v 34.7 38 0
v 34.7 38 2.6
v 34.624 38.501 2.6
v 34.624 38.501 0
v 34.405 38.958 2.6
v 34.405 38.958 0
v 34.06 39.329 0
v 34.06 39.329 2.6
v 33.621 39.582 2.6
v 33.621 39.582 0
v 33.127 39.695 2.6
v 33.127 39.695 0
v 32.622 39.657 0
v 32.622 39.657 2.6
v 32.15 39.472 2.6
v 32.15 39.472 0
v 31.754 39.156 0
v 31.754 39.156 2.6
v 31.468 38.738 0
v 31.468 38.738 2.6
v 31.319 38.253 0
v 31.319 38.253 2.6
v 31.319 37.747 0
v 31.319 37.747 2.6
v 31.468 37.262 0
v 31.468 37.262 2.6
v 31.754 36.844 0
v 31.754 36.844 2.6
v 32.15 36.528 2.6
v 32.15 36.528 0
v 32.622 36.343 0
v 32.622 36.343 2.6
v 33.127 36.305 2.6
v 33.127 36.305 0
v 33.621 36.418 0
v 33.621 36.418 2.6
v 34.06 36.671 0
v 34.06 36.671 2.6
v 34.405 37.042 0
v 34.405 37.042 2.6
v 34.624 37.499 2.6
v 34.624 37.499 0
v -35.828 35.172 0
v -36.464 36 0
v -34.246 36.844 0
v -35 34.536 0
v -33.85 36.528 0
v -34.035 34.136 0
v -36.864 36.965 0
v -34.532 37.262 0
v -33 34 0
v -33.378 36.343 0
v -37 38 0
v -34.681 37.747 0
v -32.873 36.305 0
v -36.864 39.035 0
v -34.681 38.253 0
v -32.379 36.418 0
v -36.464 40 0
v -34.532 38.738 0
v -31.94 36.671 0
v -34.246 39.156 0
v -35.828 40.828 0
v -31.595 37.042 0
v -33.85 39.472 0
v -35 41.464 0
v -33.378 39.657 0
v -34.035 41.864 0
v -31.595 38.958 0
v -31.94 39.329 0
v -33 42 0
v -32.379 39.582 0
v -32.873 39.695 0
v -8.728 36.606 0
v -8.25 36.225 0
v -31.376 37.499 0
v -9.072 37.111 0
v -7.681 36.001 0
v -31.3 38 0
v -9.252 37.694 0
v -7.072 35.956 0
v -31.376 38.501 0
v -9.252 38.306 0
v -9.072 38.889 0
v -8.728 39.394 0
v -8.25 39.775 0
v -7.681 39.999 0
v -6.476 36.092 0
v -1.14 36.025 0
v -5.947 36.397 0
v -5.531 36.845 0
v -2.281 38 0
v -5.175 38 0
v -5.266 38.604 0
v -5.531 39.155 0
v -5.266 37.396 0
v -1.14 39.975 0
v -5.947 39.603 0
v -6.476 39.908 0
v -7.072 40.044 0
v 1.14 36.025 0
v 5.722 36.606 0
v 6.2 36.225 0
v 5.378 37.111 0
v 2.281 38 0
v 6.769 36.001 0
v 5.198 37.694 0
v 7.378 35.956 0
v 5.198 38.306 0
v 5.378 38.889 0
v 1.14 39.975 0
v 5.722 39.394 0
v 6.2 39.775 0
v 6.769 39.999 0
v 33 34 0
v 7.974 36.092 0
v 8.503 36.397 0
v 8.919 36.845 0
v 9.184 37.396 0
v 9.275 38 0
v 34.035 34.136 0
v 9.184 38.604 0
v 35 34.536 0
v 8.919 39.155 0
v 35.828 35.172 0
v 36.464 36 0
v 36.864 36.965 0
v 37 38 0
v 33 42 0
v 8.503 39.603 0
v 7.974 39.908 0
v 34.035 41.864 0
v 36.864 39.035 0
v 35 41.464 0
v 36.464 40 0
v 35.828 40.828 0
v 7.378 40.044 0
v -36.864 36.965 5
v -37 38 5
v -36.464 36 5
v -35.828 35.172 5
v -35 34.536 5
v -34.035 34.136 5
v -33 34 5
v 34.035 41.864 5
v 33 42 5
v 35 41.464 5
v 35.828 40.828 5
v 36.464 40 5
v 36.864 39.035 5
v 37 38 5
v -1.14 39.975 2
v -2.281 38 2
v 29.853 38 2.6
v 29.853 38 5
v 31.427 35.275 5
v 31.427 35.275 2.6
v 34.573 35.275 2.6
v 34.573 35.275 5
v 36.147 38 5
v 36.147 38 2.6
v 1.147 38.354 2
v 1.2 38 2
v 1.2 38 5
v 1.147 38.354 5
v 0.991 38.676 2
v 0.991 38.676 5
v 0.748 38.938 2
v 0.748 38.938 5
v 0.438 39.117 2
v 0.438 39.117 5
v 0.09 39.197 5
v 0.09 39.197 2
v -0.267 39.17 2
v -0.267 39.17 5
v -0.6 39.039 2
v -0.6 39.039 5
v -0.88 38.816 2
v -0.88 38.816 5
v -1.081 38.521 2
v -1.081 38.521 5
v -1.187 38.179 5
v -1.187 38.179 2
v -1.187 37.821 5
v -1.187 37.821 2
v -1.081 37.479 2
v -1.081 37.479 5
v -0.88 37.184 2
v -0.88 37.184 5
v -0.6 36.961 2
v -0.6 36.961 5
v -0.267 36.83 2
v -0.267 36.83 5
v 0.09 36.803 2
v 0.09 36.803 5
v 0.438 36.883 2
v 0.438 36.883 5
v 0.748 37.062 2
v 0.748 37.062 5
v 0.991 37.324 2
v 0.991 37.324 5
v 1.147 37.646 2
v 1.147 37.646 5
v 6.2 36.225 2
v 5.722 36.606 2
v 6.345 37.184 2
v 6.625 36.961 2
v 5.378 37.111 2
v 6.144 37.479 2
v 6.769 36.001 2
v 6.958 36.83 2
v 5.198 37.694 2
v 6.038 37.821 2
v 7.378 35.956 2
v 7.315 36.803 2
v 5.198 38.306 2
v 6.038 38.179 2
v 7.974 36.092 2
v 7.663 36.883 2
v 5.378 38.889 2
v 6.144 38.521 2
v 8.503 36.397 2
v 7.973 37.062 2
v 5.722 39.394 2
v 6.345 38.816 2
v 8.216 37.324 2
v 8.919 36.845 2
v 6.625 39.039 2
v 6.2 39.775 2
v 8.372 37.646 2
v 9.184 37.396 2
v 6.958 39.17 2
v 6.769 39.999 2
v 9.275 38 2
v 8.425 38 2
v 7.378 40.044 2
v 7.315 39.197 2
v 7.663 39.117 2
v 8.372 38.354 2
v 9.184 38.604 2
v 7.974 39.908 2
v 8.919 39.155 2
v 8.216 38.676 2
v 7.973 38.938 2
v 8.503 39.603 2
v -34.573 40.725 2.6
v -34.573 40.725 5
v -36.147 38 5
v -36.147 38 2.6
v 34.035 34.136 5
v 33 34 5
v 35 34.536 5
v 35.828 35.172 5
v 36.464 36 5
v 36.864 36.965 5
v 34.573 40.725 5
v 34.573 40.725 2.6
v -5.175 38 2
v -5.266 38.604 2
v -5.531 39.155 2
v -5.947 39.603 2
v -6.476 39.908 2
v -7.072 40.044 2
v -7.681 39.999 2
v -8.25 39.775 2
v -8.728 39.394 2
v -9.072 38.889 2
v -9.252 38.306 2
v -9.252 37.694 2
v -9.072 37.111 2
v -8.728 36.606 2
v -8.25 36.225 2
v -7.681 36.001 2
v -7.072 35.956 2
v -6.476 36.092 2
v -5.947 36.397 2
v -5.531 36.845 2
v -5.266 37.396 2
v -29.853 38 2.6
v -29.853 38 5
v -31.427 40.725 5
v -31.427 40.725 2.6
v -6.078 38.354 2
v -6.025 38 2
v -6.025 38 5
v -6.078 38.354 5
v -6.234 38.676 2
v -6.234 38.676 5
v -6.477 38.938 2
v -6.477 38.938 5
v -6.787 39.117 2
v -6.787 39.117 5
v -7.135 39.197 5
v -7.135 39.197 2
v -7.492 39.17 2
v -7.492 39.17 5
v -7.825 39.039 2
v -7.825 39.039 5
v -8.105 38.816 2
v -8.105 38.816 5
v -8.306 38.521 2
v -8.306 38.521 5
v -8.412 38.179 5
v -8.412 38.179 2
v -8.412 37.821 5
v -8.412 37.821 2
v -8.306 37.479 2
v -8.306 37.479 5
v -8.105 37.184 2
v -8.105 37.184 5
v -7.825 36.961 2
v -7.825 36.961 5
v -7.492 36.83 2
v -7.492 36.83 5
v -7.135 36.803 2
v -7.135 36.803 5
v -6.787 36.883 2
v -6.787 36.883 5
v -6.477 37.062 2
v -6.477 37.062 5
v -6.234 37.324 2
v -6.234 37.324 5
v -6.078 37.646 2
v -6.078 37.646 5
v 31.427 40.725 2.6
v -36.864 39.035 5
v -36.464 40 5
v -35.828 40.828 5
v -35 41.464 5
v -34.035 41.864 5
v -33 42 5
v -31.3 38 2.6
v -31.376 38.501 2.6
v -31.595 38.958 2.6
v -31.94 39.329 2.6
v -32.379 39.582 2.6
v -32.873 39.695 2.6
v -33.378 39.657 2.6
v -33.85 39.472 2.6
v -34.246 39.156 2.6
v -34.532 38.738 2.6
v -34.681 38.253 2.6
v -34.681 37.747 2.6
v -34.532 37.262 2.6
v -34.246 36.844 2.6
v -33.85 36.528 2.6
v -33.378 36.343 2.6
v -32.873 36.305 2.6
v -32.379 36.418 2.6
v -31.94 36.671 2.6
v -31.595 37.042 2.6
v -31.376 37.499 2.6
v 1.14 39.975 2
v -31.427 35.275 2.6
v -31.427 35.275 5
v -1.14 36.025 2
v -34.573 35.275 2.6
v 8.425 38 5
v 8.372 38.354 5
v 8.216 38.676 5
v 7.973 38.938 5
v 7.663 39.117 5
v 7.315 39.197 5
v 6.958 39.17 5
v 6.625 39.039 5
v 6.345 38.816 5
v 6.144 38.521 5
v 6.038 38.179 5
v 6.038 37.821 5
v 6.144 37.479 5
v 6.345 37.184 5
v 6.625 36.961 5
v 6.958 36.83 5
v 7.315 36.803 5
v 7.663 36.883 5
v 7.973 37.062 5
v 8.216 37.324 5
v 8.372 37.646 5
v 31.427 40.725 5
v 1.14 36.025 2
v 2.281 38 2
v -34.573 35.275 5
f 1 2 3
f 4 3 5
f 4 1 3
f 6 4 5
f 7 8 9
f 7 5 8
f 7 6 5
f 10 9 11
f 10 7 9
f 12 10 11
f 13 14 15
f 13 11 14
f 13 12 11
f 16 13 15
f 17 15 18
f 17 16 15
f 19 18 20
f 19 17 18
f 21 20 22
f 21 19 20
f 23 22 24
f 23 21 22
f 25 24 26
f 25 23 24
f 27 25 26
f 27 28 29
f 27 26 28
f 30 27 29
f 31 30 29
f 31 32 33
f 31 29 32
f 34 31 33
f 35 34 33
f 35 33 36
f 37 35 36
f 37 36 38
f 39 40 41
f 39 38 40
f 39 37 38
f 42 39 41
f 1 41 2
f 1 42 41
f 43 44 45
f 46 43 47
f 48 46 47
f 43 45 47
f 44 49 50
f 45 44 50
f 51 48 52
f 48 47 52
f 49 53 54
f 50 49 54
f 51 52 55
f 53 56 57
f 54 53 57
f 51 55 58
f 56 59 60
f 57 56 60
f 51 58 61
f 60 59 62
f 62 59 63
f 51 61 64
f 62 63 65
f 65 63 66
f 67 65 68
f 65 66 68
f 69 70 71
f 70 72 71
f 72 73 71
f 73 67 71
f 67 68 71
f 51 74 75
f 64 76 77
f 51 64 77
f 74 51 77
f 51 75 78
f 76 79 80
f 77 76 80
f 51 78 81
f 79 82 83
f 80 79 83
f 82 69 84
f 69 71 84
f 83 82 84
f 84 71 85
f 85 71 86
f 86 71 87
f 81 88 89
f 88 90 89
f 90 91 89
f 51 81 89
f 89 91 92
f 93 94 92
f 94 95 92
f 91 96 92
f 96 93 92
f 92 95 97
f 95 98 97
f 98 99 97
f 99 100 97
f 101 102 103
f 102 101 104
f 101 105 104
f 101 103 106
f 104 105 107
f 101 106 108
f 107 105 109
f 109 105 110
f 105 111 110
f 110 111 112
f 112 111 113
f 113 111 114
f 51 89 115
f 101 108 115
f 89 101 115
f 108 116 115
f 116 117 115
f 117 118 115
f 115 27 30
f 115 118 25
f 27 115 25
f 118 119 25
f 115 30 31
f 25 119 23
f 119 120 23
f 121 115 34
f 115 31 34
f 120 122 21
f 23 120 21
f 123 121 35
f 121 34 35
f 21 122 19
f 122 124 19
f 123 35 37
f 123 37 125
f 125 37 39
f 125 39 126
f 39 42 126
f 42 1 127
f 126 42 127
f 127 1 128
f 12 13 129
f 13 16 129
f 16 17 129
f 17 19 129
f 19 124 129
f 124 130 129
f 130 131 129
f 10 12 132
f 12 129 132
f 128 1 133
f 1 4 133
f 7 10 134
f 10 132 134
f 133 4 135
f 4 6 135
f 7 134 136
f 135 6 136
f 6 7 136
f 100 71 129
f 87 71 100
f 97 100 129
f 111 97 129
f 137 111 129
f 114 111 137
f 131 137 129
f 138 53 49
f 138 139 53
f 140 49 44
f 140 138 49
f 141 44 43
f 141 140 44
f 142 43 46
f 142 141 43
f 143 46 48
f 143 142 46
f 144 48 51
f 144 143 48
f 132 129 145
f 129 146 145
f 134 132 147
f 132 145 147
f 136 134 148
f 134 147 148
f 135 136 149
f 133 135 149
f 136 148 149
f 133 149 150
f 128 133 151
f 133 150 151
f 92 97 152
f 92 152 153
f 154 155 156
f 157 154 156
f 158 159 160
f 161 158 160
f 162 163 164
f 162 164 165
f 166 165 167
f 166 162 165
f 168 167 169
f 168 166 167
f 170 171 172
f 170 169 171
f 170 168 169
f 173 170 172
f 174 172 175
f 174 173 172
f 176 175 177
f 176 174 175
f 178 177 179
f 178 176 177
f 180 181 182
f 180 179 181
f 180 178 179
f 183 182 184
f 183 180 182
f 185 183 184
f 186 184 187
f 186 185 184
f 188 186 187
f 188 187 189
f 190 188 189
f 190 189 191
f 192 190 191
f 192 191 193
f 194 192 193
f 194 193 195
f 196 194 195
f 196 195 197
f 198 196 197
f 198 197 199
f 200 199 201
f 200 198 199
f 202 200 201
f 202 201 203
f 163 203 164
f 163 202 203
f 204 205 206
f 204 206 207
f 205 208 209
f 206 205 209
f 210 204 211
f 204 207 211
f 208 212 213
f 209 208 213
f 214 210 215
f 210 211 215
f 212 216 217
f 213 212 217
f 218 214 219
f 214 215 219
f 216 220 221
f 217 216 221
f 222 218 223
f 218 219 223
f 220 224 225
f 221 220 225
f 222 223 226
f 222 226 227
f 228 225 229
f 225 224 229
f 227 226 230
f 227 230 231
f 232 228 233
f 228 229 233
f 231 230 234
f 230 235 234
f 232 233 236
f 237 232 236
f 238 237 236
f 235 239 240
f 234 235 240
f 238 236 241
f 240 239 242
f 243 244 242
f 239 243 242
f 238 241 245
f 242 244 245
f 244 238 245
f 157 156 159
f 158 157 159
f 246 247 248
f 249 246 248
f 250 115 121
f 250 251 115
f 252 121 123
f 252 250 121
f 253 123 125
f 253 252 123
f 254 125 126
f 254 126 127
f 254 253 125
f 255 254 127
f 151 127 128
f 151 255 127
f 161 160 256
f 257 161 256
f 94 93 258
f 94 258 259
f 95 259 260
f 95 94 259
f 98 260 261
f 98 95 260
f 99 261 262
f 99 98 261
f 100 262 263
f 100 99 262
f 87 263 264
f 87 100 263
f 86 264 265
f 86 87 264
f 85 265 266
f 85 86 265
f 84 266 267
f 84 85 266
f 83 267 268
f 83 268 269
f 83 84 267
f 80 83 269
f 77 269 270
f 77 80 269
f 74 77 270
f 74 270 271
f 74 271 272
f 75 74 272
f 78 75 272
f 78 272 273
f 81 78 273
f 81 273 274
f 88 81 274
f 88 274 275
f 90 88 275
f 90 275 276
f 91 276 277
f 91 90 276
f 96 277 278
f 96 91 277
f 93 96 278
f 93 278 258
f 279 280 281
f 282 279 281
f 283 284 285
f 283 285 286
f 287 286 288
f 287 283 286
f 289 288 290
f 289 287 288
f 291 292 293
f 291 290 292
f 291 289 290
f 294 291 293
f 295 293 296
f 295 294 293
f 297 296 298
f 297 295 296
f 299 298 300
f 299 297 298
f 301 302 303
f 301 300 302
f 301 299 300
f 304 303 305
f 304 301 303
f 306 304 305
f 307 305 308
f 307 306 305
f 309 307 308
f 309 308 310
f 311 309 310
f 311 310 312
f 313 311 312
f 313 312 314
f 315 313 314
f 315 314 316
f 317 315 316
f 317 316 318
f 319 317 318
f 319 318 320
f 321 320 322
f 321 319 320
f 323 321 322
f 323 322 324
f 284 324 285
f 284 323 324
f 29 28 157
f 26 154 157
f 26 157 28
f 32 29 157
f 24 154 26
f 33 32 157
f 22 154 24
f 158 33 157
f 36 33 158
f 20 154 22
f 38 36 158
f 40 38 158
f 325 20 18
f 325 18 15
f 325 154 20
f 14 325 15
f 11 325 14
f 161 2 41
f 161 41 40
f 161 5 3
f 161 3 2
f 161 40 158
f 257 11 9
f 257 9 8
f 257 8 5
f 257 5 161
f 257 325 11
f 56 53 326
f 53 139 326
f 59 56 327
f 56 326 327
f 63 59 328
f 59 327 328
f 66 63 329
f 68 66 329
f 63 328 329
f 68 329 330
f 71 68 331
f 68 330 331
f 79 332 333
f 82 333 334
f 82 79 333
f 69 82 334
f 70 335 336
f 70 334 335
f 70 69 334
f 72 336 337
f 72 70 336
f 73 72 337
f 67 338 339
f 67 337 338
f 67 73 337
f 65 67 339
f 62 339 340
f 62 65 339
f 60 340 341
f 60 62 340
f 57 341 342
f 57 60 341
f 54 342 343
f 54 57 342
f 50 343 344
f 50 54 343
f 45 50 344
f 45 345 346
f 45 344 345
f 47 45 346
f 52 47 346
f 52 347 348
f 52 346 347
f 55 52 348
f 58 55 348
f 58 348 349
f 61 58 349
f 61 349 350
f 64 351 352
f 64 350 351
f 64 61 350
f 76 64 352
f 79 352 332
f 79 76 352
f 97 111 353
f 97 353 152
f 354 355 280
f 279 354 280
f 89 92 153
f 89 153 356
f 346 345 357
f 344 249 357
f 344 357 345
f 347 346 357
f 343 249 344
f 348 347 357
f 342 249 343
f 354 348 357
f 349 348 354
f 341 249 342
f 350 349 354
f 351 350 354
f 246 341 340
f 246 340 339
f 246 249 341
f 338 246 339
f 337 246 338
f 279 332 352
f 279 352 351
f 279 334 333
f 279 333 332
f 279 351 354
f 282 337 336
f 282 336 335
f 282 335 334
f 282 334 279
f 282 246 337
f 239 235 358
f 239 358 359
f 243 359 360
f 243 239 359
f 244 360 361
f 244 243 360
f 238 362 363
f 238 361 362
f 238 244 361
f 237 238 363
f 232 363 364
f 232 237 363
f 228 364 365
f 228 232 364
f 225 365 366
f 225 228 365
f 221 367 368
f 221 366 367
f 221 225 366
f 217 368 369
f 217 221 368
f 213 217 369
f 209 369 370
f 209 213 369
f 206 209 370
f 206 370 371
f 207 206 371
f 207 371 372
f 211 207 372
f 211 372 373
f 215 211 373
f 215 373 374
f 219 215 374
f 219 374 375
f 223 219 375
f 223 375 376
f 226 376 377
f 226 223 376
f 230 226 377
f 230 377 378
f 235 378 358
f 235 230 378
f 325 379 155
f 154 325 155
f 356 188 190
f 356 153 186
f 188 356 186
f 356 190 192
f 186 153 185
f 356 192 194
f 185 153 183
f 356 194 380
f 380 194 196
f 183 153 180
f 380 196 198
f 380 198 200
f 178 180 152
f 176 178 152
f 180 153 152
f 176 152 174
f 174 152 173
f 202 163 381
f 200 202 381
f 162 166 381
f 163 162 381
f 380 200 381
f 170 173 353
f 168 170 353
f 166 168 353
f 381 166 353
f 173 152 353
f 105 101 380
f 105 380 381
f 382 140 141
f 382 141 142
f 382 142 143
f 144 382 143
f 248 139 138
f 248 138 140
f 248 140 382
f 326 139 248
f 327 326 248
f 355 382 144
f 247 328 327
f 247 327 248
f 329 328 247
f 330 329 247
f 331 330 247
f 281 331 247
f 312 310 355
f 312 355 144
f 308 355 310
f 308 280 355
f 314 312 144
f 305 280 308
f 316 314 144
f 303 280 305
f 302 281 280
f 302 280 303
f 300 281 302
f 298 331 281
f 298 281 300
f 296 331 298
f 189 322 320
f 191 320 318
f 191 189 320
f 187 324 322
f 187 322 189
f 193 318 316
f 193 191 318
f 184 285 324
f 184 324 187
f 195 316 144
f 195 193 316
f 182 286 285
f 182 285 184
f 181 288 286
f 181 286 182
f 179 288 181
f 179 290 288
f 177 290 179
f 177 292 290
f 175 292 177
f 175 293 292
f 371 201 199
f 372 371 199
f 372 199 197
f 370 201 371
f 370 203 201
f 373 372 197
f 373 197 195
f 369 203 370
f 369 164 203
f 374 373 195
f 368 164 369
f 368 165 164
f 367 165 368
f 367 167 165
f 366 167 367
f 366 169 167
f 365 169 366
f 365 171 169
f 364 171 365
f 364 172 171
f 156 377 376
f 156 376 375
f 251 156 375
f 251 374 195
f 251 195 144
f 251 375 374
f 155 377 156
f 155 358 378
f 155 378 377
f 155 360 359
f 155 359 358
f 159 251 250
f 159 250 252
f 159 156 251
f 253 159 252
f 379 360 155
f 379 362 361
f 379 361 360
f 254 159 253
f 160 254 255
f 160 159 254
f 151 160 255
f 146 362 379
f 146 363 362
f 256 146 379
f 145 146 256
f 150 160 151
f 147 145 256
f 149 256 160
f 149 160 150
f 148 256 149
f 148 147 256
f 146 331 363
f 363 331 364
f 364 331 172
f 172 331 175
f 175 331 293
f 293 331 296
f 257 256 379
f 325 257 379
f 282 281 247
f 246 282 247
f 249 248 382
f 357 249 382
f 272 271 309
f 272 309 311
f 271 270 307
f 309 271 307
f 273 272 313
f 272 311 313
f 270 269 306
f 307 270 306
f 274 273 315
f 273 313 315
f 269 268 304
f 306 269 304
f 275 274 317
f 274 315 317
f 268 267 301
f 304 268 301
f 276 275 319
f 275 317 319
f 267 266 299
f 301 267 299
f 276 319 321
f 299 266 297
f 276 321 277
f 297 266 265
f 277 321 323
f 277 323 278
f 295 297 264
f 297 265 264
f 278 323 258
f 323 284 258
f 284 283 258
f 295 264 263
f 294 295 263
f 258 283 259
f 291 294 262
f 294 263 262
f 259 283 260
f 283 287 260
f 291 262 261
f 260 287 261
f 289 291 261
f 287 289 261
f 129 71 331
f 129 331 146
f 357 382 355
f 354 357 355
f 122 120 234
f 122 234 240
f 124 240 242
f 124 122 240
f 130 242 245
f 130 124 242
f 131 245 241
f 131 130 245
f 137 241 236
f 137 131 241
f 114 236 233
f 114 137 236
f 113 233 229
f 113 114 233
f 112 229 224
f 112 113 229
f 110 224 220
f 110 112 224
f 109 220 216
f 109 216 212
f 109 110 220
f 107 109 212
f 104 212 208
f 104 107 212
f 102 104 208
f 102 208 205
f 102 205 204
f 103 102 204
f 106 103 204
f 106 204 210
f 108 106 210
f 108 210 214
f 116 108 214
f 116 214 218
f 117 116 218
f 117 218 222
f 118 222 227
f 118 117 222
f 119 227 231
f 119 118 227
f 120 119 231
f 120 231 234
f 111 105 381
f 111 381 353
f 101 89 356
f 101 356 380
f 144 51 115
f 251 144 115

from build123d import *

# Parameters (mm, degrees)
F2_W      = 74
F2_H      = 8
F2_R      = 3
F5_DEPTH  = 5
F0_R      = 1.7
F6_DEPTH  = 12.5
F3_R      = 2.05
F7_DEPTH  = 2
F8_DEPTH  = 2
F10_DEPTH = 2.4
F11_R     = 3.99999
F4_R      = 1.2
F12_DEPTH = 5.001


# Not quite as in the source:
# - a fillet or chamfer is up to 0.001 mm smaller than in the source, because OpenCascade refuses the exact size


with BuildPart() as f5:
    # F2 (on face) → F5 (new body)
    with BuildSketch(Plane.XY):
        with Locations((0, 38)):
            Rectangle(F2_W, F2_H)
        with Locations((-33, 38)):
            Circle(F2_R, mode=Mode.SUBTRACT)
        Polygon((1.1402667816, 36.025), (0, 36.025), (-1.1402667816, 36.025), (-2.2805335633, 38), (-1.1402667816, 39.975), (0, 39.975), (1.1402667816, 39.975), (2.2805335633, 38), align=None, mode=Mode.SUBTRACT)
        with Locations((33, 38)):
            Circle(F2_R, mode=Mode.SUBTRACT)
        Polygon((-1.1402667816, 36.025), (0, 36.025), (1.1402667816, 36.025), (2.2805335633, 38), (1.1402667816, 39.975), (0, 39.975), (-1.1402667816, 39.975), (-2.2805335633, 38), align=None)
        with Locations((-33, 38)):
            Circle(F2_R)
        with Locations((33, 38)):
            Circle(F2_R)
    extrude(amount=F5_DEPTH)

    # F0 (on Top) → F6 (cut, symmetric)
    with BuildSketch(Plane.XY):
        with Locations((-33, 38)):
            Circle(F0_R)
        with Locations((33, 38)):
            Circle(F0_R)
        with Locations((-33, -38)):
            Circle(F0_R)
        with Locations((33, -38)):
            Circle(F0_R)
    extrude(amount=F6_DEPTH, both=True, mode=Mode.SUBTRACT)

    # F3 (on face) → F7 (cut)
    with BuildSketch(Plane.XY):
        with Locations((-7.225, 38)):
            Circle(F3_R)
        with Locations((7.225, 38)):
            Circle(F3_R)
    extrude(amount=F7_DEPTH, mode=Mode.SUBTRACT)

    # F2 (on face) → F8 (cut)
    with BuildSketch(Plane.XY):
        Polygon((-1.1402667816, 36.025), (0, 36.025), (1.1402667816, 36.025), (2.2805335633, 38), (1.1402667816, 39.975), (0, 39.975), (-1.1402667816, 39.975), (-2.2805335633, 38), align=None)
    extrude(amount=F8_DEPTH, mode=Mode.SUBTRACT)

    # F9 (on face) → F10 (cut)
    with BuildSketch(Plane.XY.offset(5)):
        Polygon((-34.5732794835, 35.275), (-33, 35.275), (-31.4267205165, 35.275), (-29.8534410329, 38), (-31.4267205165, 40.725), (-33, 40.725), (-34.5732794835, 40.725), (-36.1465589671, 38), align=None)
        Polygon((29.8534410329, 38), (31.4267205165, 35.275), (33, 35.275), (34.5732794835, 35.275), (36.1465589671, 38), (34.5732794835, 40.725), (33, 40.725), (31.4267205165, 40.725), align=None)
    extrude(amount=-F10_DEPTH, mode=Mode.SUBTRACT)

    # F11 (radius 4 in the source; OpenCascade refuses exactly that, so slightly less here)
    f11_edges = [f5.edges().sort_by_distance(p)[0] for p in [
        (-37, 42, 2.5),
        (-37, 34, 2.5),
        (37, 42, 2.5),
        (37, 34, 2.5),
    ]]
    fillet(f11_edges, radius=F11_R)

    # F4 (on face) → F12 (cut, through all)
    with BuildSketch(Plane.XY):
        with Locations((-7.225, 38)):
            Circle(F4_R)
        with Locations((0, 38)):
            Circle(F4_R)
        with Locations((7.225, 38)):
            Circle(F4_R)
    extrude(amount=F12_DEPTH, mode=Mode.SUBTRACT)


solid = f5.part
